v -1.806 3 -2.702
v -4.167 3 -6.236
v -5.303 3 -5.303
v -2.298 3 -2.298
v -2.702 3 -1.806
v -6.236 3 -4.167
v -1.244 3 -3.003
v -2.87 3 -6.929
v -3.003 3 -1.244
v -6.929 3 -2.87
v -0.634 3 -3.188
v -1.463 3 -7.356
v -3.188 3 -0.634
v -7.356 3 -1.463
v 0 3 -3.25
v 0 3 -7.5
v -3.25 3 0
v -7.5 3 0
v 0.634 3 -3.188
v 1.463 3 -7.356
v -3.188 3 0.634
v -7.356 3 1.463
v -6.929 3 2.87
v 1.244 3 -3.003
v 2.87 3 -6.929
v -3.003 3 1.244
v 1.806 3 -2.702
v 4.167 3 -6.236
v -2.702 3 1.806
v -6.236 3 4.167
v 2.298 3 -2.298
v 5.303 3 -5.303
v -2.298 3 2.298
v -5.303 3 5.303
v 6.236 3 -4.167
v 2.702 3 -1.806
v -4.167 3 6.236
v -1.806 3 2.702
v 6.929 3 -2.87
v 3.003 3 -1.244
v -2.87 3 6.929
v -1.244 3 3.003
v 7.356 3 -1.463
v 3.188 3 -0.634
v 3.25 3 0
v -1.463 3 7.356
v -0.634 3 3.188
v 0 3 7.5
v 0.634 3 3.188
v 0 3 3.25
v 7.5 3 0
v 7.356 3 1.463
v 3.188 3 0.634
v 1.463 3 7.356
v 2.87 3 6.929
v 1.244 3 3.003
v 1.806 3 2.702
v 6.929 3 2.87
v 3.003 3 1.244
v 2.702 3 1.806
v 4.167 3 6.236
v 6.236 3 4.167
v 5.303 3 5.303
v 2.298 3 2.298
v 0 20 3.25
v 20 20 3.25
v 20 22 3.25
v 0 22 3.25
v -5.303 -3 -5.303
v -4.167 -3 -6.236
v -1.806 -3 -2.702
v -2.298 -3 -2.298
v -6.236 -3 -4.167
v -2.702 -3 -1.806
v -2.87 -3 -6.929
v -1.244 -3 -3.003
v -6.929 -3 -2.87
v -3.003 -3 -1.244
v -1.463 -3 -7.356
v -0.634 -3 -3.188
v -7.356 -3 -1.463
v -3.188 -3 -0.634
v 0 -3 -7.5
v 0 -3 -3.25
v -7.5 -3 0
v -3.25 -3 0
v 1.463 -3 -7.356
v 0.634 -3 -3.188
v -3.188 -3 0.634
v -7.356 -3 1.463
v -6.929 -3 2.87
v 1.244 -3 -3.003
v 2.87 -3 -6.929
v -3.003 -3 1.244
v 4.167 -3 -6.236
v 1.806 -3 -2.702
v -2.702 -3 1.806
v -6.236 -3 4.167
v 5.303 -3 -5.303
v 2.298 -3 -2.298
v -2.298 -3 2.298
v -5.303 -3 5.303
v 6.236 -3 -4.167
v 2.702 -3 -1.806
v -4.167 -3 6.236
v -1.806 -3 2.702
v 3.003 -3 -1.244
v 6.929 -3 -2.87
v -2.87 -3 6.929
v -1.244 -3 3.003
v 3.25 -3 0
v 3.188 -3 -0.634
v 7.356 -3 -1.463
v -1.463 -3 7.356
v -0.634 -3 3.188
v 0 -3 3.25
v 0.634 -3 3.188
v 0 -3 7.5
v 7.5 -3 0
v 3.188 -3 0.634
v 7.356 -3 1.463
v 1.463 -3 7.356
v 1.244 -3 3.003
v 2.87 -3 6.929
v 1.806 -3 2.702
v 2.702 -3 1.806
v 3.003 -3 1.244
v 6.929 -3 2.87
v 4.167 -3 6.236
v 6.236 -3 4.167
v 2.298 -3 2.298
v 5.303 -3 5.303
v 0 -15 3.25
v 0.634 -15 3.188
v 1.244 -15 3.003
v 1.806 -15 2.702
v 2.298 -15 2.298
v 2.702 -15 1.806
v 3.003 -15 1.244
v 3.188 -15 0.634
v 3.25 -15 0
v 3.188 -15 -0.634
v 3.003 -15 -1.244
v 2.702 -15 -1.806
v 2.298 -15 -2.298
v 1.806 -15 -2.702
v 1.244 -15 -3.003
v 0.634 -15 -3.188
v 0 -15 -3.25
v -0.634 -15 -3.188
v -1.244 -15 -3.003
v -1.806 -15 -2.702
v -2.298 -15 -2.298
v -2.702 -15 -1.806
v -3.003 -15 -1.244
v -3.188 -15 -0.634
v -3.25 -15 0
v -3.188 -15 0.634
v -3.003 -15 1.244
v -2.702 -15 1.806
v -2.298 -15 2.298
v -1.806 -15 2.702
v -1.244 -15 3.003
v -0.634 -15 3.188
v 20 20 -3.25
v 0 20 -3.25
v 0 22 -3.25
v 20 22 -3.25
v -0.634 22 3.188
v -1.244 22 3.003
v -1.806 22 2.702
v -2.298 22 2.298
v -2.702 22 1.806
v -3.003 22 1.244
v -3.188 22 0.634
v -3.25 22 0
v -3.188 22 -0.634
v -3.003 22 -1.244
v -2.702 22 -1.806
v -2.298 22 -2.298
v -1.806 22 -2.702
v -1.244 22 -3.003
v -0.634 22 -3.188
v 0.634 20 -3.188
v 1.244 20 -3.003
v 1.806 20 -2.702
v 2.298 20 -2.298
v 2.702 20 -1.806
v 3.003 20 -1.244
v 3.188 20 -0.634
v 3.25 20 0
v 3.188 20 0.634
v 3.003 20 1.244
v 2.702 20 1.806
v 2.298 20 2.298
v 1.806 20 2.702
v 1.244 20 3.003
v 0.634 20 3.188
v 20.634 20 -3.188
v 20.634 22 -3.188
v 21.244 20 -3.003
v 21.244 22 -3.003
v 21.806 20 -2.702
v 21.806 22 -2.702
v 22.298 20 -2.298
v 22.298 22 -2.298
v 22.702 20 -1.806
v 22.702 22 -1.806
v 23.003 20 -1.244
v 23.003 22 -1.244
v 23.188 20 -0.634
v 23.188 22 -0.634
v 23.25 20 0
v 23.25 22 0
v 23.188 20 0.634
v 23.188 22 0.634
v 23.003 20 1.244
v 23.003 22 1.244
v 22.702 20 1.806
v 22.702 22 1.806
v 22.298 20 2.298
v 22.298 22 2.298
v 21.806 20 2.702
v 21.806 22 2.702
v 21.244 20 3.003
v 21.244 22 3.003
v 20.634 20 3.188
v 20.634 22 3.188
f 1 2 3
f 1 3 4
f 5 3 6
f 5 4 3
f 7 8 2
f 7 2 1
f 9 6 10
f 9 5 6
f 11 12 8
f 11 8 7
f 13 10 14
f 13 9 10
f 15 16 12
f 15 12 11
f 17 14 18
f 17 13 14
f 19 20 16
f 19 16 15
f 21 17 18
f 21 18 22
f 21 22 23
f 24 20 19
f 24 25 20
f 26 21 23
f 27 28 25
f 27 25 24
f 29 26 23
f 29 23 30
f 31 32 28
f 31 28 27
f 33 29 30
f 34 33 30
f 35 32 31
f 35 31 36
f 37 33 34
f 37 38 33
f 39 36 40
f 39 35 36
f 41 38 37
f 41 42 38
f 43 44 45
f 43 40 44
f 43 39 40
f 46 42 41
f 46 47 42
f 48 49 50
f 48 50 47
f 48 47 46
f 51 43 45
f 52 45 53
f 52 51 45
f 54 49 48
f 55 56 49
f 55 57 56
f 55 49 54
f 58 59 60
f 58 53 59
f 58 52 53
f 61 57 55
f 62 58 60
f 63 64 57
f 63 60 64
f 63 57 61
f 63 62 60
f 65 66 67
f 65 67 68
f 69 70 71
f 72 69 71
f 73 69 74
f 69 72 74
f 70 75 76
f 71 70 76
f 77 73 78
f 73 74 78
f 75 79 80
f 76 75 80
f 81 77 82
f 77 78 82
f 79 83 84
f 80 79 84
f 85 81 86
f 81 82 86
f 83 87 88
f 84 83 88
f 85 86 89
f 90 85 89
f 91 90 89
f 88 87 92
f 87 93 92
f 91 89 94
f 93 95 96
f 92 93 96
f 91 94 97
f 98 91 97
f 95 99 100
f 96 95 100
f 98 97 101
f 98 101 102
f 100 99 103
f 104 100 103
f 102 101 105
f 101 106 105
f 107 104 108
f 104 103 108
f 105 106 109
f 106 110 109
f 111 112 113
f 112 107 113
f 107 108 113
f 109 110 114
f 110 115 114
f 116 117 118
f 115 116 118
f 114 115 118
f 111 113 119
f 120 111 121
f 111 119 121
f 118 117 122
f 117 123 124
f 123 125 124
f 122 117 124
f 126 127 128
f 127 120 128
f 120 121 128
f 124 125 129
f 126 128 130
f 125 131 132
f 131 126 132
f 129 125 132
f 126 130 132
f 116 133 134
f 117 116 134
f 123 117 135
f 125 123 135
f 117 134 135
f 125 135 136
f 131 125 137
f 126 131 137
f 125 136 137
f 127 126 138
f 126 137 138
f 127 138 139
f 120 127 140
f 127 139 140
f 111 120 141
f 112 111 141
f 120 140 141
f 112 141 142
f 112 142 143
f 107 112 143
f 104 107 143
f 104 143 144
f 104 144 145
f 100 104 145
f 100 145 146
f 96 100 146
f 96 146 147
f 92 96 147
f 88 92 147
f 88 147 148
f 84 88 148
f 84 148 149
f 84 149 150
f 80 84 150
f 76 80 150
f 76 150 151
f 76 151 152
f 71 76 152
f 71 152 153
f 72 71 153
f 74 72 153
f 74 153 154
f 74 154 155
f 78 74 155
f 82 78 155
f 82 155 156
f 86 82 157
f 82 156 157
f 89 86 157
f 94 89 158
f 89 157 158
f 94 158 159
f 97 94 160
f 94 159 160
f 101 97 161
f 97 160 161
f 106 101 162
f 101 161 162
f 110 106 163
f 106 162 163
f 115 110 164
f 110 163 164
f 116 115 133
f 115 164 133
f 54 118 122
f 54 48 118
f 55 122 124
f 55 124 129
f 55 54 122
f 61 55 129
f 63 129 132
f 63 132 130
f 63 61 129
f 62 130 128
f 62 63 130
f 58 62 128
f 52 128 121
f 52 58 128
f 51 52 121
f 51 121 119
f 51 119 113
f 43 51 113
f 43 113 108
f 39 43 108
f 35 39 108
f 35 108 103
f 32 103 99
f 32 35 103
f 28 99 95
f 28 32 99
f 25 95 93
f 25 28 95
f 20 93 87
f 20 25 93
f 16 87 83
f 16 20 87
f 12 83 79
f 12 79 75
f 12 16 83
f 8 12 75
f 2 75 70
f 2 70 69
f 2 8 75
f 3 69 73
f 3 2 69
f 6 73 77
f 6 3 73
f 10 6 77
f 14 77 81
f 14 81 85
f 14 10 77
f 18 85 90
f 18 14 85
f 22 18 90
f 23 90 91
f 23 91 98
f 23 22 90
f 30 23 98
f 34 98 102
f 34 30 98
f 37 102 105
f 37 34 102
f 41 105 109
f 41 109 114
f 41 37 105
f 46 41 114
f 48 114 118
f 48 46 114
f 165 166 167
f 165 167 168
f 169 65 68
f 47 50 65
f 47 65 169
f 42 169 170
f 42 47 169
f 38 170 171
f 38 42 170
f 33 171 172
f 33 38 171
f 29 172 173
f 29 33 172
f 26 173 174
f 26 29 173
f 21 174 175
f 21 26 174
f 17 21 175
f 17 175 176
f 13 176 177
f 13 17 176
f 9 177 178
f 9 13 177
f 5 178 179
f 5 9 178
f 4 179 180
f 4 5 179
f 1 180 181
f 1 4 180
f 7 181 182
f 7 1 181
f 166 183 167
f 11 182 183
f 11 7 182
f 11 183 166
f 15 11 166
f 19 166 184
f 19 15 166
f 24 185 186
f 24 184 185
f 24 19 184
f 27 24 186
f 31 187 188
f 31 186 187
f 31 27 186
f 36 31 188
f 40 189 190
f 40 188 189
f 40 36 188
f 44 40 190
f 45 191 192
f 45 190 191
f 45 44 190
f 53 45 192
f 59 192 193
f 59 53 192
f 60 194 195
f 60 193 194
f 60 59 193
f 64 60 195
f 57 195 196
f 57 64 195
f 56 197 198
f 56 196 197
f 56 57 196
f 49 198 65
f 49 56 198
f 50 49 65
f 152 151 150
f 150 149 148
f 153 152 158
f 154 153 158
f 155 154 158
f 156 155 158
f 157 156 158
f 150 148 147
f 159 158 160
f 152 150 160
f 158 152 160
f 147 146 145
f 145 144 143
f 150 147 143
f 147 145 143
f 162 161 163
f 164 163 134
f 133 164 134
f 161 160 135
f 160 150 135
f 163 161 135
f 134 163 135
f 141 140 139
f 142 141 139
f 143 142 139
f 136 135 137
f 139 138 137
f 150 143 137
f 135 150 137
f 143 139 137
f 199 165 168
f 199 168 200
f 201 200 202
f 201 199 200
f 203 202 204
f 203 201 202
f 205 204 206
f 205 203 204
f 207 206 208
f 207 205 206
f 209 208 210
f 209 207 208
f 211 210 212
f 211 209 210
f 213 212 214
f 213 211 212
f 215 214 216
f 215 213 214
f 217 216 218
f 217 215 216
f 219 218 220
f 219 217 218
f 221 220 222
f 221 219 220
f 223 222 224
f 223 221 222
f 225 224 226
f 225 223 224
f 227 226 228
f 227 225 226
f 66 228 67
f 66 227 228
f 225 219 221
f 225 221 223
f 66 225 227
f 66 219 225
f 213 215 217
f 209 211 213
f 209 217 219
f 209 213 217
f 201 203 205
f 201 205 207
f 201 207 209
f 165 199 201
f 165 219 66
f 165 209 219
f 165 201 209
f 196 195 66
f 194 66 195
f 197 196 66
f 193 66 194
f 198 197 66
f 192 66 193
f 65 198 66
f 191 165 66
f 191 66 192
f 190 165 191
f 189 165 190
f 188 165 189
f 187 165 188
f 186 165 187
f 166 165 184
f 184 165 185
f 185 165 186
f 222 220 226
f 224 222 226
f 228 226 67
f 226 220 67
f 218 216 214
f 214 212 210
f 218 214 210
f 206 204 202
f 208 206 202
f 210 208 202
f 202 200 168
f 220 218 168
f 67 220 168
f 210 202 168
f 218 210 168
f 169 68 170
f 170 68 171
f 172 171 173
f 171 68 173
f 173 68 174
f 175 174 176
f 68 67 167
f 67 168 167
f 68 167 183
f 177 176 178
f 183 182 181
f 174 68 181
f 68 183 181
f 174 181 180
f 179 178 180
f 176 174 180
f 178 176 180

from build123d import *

# Parameters (mm, degrees)
SALIENTE_EXTRUIR1_DEPTH      = 20
SALIENTE_EXTRUIR1_DEPTH_BACK = 15
CROQUIS1_R                   = 3.25
CROQUIS1_3_R                 = 7.5
CROQUIS1_3_R_2               = 3.25
SALIENTE_EXTRUIR2_DEPTH      = 3
SALIENTE_EXTRUIR3_DEPTH      = 2


with BuildPart() as part:
    # Croquis1 → Saliente-Extruir1 (new, two sides: drawn at the far end of the back side and taken through both)
    with BuildSketch(Plane(origin=(0, 0, 0), x_dir=(1, 0, 0), z_dir=(0, 1, 0)).offset(-SALIENTE_EXTRUIR1_DEPTH_BACK)):
        Circle(CROQUIS1_R)
    extrude(amount=SALIENTE_EXTRUIR1_DEPTH + SALIENTE_EXTRUIR1_DEPTH_BACK)

    # Croquis1<3> → Saliente-Extruir2 (add, symmetric)
    with BuildSketch(Plane(origin=(0, 0, 0), x_dir=(1, 0, 0), z_dir=(0, 1, 0))):
        Circle(CROQUIS1_3_R)
        Circle(CROQUIS1_3_R_2, mode=Mode.SUBTRACT)
    extrude(amount=SALIENTE_EXTRUIR2_DEPTH, both=True)

    # Croquis2 → Saliente-Extruir3 (add)
    with BuildSketch(Plane(origin=(0, 20, 0), x_dir=(1, 0, 0), z_dir=(0, 1, 0))):
        with BuildLine():
            Line((0, 3.25), (20, 3.25))
            ThreePointArc((20, 3.25), (23.25, 0), (20, -3.25))
            Line((20, -3.25), (0, -3.25))
            ThreePointArc((0, -3.25), (-3.25, 0), (0, 3.25))
        make_face()
    extrude(amount=SALIENTE_EXTRUIR3_DEPTH)


solid = part.part
